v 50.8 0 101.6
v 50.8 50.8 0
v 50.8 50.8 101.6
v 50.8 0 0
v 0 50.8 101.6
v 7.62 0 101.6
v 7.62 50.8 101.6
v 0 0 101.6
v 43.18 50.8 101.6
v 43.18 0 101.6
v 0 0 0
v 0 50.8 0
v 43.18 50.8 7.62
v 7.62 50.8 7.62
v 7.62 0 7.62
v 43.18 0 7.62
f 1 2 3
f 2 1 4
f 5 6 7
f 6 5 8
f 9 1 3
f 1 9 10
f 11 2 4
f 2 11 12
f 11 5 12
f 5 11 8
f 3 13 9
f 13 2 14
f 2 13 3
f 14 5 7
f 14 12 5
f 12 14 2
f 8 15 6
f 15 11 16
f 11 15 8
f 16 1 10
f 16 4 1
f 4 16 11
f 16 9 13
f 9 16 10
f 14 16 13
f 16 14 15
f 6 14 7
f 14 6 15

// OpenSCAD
inch = 25.4;

holder_x = 2 * inch;
holder_y =  2 * inch;
holder_z = 4 * inch;

wall_thickness = .3 * inch;

difference() {
    cube([holder_x, holder_y, holder_z]);

    translate([wall_thickness, 0, wall_thickness]) {
        cube([(holder_x - (wall_thickness * 2)), holder_y, holder_z]);
    }
}
